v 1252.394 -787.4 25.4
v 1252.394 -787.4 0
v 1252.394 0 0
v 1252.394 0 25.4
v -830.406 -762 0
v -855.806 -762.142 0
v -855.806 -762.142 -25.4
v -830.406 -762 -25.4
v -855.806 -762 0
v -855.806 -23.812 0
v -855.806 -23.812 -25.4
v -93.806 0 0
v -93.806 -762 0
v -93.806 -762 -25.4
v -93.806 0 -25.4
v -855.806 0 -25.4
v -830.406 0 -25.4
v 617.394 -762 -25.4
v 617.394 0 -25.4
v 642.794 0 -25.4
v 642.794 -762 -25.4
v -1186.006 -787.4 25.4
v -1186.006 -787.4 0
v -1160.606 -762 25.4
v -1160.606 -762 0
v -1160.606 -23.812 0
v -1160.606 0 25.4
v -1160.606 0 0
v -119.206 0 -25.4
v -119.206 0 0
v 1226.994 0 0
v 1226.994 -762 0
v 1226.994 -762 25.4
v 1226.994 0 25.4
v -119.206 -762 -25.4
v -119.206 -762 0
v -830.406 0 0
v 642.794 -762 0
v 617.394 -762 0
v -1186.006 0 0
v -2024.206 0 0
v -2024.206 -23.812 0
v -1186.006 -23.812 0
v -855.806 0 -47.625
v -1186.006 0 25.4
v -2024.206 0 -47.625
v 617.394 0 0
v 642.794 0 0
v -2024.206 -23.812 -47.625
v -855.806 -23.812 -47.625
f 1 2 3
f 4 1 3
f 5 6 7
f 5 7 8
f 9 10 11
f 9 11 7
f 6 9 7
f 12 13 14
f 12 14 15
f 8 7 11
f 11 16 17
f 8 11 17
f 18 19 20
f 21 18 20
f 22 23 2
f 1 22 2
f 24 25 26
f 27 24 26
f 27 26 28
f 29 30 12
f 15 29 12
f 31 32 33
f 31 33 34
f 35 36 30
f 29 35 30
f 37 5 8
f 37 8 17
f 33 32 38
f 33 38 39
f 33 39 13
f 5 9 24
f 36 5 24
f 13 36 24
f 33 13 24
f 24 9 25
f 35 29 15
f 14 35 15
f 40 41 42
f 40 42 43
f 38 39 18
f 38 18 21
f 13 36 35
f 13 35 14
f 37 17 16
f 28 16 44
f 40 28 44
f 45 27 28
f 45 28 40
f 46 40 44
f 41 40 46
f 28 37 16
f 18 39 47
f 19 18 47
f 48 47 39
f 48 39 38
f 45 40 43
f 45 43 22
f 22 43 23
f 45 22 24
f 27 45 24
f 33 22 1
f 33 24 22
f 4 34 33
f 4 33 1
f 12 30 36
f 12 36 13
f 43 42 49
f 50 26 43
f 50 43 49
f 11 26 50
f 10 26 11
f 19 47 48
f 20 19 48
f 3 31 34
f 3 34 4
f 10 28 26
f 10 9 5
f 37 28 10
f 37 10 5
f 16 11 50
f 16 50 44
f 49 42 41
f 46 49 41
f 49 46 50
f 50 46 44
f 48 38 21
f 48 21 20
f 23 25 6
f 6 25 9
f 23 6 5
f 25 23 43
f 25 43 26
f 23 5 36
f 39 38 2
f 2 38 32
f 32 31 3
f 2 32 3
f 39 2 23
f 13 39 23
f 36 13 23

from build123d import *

# Parameters (mm, degrees)
F0_W     = 25.4
F0_H     = 762
F1_DEPTH = 25.4
F2_W     = 1168.4
F2_H     = 23.8125
F3_DEPTH = 47.625
F4_W     = 25.4
F4_H     = 762
F5_DEPTH = 25.4


with BuildPart() as f1:
    # F0 (on Top) → F1 (new body)
    with BuildSketch(Plane.XY):
        Polygon((-1186.006427, -787.4), (1252.393573, -787.4), (1252.393573, -762), (1226.993573, -762), (-1160.606427, -762), (-1186.006427, -762), align=None)
        with Locations((1239.693573, -381)):
            Rectangle(F0_W, F0_H)
        with Locations((-1173.306427, -381)):
            Rectangle(F0_W, F0_H)
    extrude(amount=F1_DEPTH)

    # F2 (on Top) → F3 (join)
    with BuildSketch(Plane.XY):
        with Locations((-1440.006427, -11.90625)):
            Rectangle(F2_W, F2_H)
    extrude(amount=-F3_DEPTH)

    # F4 (on Top) → F5 (join)
    with BuildSketch(Plane.XY):
        with Locations((-106.506427, -381)):
            Rectangle(F4_W, F4_H)
        with Locations((630.093573, -381)):
            Rectangle(F4_W, F4_H)
        Polygon((-830.406427, 0), (-855.806427, 0), (-855.806427, -762.142062), (-830.406427, -762), align=None)
    extrude(amount=-F5_DEPTH)


solid = f1.part
